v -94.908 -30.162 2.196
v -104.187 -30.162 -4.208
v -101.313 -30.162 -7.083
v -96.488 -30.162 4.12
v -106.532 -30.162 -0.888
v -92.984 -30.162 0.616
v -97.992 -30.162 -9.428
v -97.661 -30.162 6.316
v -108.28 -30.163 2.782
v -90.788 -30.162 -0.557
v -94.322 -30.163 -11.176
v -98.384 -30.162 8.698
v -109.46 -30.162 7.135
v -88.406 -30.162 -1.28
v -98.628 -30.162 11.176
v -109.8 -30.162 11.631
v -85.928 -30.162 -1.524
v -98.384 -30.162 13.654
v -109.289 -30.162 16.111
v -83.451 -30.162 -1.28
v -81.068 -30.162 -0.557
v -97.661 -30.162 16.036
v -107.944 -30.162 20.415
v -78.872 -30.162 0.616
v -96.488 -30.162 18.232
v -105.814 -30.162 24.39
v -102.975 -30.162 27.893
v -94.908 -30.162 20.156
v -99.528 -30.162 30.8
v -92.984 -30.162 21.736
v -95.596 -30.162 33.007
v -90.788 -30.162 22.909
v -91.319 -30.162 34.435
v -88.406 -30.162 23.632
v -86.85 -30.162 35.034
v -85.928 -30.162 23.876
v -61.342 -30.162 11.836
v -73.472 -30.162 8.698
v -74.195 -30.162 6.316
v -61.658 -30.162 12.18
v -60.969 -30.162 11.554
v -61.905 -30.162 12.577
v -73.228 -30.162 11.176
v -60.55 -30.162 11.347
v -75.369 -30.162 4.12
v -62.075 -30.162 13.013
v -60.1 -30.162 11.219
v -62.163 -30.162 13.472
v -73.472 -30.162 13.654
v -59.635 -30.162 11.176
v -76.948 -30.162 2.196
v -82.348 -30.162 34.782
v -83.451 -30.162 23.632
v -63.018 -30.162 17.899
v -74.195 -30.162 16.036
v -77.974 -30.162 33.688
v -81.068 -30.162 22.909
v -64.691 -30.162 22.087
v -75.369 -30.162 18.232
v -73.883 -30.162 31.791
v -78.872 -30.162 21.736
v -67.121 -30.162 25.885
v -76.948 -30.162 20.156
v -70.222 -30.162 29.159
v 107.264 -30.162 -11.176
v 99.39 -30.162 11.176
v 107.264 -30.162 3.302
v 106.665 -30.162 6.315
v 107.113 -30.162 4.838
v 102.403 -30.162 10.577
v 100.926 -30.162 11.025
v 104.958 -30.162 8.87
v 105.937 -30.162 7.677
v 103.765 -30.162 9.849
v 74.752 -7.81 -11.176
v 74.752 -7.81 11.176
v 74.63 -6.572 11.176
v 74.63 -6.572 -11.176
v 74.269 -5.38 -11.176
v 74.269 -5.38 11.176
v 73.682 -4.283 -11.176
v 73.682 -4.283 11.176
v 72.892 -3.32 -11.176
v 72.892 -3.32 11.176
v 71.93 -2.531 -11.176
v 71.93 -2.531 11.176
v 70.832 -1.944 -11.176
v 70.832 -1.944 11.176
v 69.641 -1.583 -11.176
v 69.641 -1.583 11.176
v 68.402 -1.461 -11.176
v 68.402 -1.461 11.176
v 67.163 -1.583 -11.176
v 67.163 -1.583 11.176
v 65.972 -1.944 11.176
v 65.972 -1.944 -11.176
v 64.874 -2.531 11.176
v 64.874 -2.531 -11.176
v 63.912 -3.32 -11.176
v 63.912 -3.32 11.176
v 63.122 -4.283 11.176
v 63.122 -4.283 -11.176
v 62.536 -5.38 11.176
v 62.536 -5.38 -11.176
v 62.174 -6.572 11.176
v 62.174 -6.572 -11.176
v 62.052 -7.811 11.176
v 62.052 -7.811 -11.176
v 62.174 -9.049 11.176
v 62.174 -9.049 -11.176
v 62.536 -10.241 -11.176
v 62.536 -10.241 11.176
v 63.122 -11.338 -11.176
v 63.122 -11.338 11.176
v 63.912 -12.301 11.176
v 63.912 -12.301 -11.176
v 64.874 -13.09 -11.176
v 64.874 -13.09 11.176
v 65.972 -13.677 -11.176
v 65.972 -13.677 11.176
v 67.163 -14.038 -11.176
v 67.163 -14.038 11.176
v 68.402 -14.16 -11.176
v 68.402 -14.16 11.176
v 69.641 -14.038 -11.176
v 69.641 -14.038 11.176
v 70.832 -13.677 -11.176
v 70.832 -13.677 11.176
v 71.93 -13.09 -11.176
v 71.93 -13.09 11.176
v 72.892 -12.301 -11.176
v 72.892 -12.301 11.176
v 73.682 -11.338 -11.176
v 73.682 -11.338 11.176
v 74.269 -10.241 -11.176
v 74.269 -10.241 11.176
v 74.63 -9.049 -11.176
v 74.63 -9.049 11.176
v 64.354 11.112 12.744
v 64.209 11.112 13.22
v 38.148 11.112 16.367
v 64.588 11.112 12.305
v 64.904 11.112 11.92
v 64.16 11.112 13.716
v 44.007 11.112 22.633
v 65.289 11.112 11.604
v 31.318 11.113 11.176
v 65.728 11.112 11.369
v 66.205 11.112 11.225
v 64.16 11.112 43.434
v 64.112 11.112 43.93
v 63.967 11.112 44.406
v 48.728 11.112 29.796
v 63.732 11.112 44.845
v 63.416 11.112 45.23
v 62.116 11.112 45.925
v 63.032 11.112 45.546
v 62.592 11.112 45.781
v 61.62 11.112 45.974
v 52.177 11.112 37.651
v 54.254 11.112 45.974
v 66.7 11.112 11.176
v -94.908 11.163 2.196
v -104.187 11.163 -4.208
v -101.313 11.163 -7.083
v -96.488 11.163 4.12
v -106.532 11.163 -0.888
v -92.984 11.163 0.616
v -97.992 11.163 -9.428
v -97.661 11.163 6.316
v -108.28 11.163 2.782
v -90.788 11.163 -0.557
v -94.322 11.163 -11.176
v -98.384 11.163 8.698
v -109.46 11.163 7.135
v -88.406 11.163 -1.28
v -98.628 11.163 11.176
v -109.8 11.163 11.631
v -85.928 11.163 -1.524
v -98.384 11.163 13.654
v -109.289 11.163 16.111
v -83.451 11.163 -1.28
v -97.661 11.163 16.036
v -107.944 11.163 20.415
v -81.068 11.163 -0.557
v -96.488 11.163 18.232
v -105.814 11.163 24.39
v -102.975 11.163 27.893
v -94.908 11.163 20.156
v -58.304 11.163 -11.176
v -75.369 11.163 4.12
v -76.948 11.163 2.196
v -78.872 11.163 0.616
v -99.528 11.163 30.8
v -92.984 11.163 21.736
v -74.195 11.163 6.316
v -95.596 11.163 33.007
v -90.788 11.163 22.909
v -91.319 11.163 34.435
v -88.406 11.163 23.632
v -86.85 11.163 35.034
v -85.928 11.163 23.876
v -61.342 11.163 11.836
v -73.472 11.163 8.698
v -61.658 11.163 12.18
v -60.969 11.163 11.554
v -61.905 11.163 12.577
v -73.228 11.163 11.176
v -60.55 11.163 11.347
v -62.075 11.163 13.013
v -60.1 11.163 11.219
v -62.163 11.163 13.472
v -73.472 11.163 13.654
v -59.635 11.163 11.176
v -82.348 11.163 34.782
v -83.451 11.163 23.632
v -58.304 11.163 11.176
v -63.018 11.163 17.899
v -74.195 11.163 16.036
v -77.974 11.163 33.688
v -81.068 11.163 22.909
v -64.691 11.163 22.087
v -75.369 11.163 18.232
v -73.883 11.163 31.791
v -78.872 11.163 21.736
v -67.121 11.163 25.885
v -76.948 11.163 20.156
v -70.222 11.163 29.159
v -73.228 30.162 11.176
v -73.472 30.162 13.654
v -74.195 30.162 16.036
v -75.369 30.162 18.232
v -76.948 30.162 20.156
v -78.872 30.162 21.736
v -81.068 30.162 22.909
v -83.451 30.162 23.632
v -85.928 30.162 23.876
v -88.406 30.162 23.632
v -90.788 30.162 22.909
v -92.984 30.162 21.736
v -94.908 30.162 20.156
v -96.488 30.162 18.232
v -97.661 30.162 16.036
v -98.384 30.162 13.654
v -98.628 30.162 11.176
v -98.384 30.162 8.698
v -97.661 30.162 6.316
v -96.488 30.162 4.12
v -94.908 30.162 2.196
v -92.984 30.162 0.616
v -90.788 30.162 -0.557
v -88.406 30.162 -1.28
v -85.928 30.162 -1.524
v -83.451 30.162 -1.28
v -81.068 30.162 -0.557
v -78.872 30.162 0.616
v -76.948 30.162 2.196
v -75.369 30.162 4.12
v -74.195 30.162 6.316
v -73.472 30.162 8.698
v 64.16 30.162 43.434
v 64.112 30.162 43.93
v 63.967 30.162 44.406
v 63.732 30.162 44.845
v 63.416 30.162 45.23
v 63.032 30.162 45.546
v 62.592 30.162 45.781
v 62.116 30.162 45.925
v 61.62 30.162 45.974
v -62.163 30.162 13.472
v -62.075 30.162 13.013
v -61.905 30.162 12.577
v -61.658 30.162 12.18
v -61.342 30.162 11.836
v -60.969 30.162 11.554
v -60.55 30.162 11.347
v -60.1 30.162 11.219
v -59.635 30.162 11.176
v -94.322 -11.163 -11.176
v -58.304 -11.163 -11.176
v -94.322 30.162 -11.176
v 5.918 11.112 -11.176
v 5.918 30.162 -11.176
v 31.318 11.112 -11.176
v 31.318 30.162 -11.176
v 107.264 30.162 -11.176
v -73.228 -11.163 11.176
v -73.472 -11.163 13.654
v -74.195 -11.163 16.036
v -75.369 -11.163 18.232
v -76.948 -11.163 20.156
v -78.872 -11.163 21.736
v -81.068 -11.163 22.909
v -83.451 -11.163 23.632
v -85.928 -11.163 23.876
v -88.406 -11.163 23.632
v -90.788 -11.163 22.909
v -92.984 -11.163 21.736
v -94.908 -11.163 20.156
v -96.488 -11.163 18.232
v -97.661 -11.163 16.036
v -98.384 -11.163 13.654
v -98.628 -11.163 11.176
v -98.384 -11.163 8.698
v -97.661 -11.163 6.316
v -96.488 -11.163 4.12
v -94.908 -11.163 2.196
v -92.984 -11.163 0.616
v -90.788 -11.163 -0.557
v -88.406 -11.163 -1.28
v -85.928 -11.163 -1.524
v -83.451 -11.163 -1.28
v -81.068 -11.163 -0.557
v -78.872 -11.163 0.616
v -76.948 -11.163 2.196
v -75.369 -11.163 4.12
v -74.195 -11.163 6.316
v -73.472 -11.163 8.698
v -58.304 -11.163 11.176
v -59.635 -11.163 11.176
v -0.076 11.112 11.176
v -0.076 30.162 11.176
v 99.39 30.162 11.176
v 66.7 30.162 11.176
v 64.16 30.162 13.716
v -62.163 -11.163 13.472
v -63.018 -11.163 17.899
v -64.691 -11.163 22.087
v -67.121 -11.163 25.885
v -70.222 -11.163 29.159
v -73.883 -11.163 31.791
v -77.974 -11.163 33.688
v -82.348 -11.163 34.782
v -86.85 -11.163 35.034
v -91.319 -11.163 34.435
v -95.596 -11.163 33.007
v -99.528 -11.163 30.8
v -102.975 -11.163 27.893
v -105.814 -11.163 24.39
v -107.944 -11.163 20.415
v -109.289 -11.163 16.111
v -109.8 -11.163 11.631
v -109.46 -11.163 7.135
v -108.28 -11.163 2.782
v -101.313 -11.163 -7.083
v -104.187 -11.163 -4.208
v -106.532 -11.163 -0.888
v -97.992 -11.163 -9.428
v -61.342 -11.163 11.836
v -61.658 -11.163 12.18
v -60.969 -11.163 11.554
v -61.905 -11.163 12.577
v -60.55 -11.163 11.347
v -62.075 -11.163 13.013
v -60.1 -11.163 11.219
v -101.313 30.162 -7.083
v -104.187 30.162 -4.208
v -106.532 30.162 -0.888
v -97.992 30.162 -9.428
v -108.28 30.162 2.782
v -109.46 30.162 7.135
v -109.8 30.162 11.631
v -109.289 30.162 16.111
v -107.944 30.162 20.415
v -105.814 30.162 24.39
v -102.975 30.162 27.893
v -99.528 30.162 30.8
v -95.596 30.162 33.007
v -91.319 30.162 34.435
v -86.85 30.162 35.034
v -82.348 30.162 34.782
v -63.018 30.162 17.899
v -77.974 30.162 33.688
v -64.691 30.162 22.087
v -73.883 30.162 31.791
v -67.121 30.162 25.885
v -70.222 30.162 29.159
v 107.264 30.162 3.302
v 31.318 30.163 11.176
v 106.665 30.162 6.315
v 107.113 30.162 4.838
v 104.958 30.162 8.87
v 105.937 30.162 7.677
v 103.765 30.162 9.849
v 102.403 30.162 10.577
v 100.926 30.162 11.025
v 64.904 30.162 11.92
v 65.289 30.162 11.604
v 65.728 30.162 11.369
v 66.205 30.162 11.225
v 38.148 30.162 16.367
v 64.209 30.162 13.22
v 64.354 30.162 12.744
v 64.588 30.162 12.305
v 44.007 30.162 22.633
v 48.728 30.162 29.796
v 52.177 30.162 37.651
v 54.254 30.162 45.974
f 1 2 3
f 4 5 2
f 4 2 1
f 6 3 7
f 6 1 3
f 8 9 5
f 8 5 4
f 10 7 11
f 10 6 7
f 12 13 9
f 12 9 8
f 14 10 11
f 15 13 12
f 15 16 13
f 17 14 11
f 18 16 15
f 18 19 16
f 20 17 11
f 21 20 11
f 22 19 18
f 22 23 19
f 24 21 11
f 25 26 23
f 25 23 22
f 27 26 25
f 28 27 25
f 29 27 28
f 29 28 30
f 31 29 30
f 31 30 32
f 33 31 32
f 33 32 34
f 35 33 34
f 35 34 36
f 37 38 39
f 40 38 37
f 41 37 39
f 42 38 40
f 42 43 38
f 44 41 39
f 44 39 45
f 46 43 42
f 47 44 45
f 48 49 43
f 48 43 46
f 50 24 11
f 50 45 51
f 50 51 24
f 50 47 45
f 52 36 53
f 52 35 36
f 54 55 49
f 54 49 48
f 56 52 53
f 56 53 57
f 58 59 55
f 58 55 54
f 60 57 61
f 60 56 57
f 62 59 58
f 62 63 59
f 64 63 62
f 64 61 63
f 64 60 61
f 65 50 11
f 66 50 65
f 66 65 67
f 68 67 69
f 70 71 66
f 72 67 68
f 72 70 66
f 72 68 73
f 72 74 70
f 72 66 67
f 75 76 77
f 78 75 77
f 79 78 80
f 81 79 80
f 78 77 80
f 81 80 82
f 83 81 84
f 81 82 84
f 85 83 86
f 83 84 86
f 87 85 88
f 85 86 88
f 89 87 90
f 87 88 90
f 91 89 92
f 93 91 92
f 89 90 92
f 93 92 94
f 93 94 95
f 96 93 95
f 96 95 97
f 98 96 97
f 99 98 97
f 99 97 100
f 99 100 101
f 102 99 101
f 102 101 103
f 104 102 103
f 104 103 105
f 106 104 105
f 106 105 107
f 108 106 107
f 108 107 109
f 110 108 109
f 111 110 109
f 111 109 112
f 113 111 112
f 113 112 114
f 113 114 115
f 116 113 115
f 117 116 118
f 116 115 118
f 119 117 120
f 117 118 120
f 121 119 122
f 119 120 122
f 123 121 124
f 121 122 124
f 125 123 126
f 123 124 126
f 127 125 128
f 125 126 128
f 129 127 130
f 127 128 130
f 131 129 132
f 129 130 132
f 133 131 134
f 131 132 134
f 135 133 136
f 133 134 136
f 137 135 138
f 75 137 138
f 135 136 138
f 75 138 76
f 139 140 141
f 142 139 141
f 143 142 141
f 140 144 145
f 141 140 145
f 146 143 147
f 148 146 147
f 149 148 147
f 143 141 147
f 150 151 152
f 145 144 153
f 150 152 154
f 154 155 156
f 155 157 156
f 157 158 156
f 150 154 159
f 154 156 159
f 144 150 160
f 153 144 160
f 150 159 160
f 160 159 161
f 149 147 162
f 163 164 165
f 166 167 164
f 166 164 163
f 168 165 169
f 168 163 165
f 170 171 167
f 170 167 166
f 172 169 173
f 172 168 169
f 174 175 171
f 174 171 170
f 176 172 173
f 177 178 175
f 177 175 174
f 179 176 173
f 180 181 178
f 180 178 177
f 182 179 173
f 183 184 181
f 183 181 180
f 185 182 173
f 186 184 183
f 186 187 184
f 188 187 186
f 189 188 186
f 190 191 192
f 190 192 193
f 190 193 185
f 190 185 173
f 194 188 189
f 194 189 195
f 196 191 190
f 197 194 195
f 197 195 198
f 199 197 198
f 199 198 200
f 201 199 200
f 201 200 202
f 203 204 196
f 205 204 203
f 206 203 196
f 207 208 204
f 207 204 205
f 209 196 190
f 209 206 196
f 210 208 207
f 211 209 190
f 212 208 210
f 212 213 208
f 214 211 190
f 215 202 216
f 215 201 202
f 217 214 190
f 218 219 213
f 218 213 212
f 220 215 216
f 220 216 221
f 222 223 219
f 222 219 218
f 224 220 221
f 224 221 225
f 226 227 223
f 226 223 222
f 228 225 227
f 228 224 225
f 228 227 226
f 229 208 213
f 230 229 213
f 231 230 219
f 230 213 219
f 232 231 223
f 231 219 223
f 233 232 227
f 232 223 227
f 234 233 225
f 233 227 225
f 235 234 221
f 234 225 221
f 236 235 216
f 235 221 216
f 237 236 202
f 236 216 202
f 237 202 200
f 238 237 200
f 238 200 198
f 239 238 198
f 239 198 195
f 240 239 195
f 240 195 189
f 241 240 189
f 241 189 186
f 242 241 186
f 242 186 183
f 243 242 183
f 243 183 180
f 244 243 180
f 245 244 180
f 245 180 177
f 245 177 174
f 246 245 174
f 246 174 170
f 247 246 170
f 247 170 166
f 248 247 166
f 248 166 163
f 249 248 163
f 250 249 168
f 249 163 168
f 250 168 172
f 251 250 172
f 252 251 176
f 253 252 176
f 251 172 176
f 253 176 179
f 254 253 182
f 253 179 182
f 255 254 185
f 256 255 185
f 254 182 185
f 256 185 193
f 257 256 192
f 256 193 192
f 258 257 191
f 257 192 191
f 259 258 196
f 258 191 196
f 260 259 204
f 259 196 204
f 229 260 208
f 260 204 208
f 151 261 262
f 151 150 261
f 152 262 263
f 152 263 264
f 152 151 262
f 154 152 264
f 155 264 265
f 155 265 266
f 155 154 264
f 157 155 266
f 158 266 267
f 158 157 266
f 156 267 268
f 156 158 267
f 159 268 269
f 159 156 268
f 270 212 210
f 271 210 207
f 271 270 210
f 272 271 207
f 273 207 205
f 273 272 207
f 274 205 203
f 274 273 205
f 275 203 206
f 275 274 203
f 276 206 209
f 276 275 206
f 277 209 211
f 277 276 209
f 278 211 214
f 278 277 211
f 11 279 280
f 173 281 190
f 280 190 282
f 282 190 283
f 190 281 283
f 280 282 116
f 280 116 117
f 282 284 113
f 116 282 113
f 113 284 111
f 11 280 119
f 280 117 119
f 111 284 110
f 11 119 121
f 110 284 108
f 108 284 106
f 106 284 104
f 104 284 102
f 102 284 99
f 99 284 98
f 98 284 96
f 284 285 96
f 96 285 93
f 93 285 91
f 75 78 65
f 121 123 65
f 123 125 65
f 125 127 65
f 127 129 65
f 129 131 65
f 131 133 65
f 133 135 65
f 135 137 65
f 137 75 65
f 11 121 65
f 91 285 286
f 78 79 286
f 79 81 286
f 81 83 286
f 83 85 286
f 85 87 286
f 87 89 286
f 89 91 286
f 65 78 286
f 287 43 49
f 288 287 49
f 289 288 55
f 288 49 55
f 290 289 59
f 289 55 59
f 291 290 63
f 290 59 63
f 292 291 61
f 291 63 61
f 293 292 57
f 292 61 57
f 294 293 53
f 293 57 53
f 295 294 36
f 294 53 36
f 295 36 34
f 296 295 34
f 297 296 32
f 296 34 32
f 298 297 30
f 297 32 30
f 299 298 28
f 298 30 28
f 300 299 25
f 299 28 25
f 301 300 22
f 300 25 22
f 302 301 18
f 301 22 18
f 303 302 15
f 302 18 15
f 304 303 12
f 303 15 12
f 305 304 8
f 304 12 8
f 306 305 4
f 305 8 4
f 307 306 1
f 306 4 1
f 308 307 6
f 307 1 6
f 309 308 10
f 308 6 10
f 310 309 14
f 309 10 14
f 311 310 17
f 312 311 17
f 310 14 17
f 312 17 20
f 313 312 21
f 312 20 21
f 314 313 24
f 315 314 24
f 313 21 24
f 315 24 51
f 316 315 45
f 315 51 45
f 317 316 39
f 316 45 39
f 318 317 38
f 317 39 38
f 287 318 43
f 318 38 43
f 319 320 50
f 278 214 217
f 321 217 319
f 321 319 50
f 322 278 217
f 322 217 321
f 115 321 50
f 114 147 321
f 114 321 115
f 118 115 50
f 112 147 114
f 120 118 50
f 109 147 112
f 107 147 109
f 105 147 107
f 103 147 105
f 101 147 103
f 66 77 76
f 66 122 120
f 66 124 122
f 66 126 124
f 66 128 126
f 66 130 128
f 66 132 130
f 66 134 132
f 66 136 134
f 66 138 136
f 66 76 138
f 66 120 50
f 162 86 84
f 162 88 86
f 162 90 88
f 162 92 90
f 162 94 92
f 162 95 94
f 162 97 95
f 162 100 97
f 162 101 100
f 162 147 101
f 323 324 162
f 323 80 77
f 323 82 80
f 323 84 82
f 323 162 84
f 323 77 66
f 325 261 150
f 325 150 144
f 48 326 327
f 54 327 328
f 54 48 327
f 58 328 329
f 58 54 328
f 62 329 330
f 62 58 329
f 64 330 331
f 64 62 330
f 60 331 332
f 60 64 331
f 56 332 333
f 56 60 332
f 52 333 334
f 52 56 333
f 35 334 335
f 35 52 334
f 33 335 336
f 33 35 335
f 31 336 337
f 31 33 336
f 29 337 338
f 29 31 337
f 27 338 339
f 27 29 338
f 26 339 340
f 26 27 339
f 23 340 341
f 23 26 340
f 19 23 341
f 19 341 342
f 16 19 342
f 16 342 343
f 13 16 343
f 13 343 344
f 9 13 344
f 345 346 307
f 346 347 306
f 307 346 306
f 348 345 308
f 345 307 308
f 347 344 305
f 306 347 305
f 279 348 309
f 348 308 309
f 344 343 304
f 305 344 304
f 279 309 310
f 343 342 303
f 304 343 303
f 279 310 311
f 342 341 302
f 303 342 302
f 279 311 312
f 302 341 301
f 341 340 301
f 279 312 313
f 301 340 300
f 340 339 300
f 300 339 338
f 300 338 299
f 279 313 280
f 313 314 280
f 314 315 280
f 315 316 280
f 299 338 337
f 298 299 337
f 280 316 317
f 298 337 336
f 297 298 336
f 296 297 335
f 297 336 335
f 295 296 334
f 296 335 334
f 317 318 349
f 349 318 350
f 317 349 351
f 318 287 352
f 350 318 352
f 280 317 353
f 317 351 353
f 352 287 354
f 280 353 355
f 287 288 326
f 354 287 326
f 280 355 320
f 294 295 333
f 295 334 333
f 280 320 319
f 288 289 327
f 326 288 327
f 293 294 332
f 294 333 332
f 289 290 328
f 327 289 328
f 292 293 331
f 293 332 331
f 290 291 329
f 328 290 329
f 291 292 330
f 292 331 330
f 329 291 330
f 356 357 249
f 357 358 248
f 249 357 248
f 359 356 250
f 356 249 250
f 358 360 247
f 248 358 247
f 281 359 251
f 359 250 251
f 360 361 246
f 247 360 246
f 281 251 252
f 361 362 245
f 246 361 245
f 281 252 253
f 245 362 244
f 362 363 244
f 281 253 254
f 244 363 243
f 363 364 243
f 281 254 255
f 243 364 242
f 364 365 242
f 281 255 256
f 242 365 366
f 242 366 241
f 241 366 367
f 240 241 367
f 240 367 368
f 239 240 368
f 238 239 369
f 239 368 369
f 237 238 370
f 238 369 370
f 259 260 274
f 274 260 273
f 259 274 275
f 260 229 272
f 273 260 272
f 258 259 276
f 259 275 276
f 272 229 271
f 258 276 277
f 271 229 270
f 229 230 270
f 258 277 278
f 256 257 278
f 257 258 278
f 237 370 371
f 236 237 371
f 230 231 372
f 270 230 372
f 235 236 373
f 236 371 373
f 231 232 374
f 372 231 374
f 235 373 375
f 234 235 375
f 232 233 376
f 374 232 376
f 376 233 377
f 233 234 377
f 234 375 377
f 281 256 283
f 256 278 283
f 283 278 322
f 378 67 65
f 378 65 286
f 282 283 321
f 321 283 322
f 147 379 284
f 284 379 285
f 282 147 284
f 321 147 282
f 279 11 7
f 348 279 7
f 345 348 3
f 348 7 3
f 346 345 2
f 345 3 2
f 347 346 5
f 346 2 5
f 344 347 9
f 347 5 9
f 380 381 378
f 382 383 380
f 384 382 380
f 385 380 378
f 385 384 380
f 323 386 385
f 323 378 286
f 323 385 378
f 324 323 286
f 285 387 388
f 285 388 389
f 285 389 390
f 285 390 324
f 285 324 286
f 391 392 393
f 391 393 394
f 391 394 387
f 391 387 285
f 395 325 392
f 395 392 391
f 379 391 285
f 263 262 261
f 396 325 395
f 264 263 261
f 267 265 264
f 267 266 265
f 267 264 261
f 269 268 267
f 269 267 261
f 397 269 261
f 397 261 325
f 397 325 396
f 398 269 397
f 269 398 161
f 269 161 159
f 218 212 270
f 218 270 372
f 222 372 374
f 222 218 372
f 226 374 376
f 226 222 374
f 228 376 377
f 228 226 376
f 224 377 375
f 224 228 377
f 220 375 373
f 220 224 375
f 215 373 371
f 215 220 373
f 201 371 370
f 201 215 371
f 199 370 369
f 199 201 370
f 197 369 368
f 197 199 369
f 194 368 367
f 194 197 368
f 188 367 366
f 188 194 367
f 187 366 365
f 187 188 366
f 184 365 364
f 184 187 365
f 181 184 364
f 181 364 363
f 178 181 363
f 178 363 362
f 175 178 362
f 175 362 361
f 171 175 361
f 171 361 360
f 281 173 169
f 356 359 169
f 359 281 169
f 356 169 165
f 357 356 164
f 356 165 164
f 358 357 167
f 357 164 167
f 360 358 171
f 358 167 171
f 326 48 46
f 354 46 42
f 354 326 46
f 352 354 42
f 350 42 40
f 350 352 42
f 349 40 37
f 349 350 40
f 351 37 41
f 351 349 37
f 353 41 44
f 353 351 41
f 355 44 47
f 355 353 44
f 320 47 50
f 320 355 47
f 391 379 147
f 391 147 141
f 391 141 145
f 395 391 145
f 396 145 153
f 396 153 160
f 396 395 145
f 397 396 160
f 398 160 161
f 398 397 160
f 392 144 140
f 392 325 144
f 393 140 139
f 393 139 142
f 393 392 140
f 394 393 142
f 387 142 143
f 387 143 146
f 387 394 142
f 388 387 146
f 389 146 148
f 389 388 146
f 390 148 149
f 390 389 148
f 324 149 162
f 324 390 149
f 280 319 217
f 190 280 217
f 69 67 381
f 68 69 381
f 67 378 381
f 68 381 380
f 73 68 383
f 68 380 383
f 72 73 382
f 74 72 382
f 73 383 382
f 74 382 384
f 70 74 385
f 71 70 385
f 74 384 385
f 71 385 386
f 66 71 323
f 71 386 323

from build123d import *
from build123d import SkipClean  # not in build123d's __all__

# Parameters (mm, degrees)
F0_W          = 216.5604
F0_H          = 60.325
F1_DEPTH      = 11.176
F2_R          = 23.876
F2_R_2        = 12.7
F3_DEPTH      = 60.325
F5_DEPTH      = 60.326
F6_W          = 1.016
F6_H          = 60.325
F6_W_2        = 60.7332959771
F6_H_2        = 22.3266
F6_R          = 6.35
F7_DEPTH      = 22.353
F7_DEPTH_BACK = 23.877
F10_DEPTH     = 19.05
F11_DEPTH     = 19.05
F12_R         = 2.54
F13_R         = 7.874


# Not quite as in the source:
# - after a boolean that leaves OpenCascade's solid faulty, fix() repairs it


with BuildPart() as f1:
    # F0 (on Top) → F1 (new body, symmetric)
    with BuildSketch(Plane.XY):
        Rectangle(F0_W, F0_H)
    extrude(amount=F1_DEPTH, both=True)

    # F2 (on face) → F3 (join, through all)
    with BuildSketch(Plane.XZ.offset(30.1625)):
        with Locations((-85.9282, 11.176)):
            Circle(F2_R)
        with Locations((-85.9282, 11.176)):
            Circle(F2_R_2, mode=Mode.SUBTRACT)
    extrude(amount=-F3_DEPTH)

    # F4 (on face) → F5 (cut, through all)
    with BuildSketch(Plane.XZ.offset(30.1625)):
        with BuildLine():
            Line((-108.2802, -11.176), (-94.3217375141, -11.176))
            ThreePointArc((-94.3217375141, -11.176), (-102.8110815076, -5.7068815076), (-108.2802, 2.7824624859))
            Line((-108.2802, 2.7824624859), (-108.2802, -11.176))
        make_face()
        with BuildLine():
            Line((-77.5346624859, -11.176), (-94.3217375141, -11.176))
            ThreePointArc((-94.3217375141, -11.176), (-85.9282, -12.7), (-77.5346624859, -11.176))
        make_face()
        with BuildLine():
            ThreePointArc((-98.6282, 11.176), (-85.9282, -1.524), (-73.2282, 11.176))
            Line((-73.2282, 11.176), (-98.6282, 11.176))
        make_face()
    with SkipClean():  # cleaning this boolean's faces spoils the solid; the shape is the same uncleaned
        extrude(amount=-F5_DEPTH, mode=Mode.SUBTRACT)

    # F6 (on face) → F7 (cut, two sides)
    with BuildSketch(Plane.XY.offset(11.176)) as f7_sk:
        with Locations((107.7722, 0)):
            Rectangle(F6_W, F6_H)
        with Locations((-88.6705182493, 0)):
            Rectangle(F6_W_2, F6_H_2)
        with Locations((68.4022, -7.8105)):
            Circle(F6_R)
    with SkipClean():  # cleaning this boolean's faces spoils the solid; the shape is the same uncleaned
        extrude(amount=-F7_DEPTH, mode=Mode.SUBTRACT)
        extrude(f7_sk.sketch, amount=F7_DEPTH_BACK, mode=Mode.SUBTRACT)

    # F8 (on face) → F10 (cut)
    with BuildSketch(Plane(origin=(0, 30.1625, 0), x_dir=(-1, 0, 0), z_dir=(0, 1, 0))):
        Polygon((0.0762, 11.176), (-31.3182, 11.176), (-31.3182, -11.176), (-5.9182, -11.176), align=None)
    extrude(amount=-F10_DEPTH, mode=Mode.SUBTRACT)

    add(f1.part.fix(), mode=Mode.REPLACE)

    # F9 (on face) → F11 (join)
    with BuildSketch(Plane(origin=(0, 30.1625, 0), x_dir=(-1, 0, 0), z_dir=(0, 1, 0))):
        Polygon((-64.1604, 45.974), (-64.1604, -11.176), (-54.2544, -11.176), (-54.2544, 11.176), (-54.2544, 45.974), align=None)
        with BuildLine():
            Line((-54.2544, 45.974), (-54.2544, 11.176))
            Line((-54.2544, 11.176), (-31.3182, 11.176))
            ThreePointArc((-31.3182, 11.176), (-46.5191498234, 26.114588766), (-54.2544, 45.974))
        make_face()
    extrude(amount=-F11_DEPTH)

    add(f1.part.fix(), mode=Mode.REPLACE)

    # F12
    f12_edges = [f1.edges().sort_by_distance(p)[0] for p in [
        (-62.0522, 20.6629, 11.176),
        (-62.0522, -20.6629, 11.176),
        (64.1604, 20.6375, 45.974),
        (64.1604, 20.6375, 11.176),
    ]]
    fillet(f12_edges, radius=F12_R)

    # F13
    f13_edges = [f1.edges().sort_by_distance(p)[0] for p in [
        (107.2642, 0, 11.176),
    ]]
    fillet(f13_edges, radius=F13_R)


solid = f1.part
